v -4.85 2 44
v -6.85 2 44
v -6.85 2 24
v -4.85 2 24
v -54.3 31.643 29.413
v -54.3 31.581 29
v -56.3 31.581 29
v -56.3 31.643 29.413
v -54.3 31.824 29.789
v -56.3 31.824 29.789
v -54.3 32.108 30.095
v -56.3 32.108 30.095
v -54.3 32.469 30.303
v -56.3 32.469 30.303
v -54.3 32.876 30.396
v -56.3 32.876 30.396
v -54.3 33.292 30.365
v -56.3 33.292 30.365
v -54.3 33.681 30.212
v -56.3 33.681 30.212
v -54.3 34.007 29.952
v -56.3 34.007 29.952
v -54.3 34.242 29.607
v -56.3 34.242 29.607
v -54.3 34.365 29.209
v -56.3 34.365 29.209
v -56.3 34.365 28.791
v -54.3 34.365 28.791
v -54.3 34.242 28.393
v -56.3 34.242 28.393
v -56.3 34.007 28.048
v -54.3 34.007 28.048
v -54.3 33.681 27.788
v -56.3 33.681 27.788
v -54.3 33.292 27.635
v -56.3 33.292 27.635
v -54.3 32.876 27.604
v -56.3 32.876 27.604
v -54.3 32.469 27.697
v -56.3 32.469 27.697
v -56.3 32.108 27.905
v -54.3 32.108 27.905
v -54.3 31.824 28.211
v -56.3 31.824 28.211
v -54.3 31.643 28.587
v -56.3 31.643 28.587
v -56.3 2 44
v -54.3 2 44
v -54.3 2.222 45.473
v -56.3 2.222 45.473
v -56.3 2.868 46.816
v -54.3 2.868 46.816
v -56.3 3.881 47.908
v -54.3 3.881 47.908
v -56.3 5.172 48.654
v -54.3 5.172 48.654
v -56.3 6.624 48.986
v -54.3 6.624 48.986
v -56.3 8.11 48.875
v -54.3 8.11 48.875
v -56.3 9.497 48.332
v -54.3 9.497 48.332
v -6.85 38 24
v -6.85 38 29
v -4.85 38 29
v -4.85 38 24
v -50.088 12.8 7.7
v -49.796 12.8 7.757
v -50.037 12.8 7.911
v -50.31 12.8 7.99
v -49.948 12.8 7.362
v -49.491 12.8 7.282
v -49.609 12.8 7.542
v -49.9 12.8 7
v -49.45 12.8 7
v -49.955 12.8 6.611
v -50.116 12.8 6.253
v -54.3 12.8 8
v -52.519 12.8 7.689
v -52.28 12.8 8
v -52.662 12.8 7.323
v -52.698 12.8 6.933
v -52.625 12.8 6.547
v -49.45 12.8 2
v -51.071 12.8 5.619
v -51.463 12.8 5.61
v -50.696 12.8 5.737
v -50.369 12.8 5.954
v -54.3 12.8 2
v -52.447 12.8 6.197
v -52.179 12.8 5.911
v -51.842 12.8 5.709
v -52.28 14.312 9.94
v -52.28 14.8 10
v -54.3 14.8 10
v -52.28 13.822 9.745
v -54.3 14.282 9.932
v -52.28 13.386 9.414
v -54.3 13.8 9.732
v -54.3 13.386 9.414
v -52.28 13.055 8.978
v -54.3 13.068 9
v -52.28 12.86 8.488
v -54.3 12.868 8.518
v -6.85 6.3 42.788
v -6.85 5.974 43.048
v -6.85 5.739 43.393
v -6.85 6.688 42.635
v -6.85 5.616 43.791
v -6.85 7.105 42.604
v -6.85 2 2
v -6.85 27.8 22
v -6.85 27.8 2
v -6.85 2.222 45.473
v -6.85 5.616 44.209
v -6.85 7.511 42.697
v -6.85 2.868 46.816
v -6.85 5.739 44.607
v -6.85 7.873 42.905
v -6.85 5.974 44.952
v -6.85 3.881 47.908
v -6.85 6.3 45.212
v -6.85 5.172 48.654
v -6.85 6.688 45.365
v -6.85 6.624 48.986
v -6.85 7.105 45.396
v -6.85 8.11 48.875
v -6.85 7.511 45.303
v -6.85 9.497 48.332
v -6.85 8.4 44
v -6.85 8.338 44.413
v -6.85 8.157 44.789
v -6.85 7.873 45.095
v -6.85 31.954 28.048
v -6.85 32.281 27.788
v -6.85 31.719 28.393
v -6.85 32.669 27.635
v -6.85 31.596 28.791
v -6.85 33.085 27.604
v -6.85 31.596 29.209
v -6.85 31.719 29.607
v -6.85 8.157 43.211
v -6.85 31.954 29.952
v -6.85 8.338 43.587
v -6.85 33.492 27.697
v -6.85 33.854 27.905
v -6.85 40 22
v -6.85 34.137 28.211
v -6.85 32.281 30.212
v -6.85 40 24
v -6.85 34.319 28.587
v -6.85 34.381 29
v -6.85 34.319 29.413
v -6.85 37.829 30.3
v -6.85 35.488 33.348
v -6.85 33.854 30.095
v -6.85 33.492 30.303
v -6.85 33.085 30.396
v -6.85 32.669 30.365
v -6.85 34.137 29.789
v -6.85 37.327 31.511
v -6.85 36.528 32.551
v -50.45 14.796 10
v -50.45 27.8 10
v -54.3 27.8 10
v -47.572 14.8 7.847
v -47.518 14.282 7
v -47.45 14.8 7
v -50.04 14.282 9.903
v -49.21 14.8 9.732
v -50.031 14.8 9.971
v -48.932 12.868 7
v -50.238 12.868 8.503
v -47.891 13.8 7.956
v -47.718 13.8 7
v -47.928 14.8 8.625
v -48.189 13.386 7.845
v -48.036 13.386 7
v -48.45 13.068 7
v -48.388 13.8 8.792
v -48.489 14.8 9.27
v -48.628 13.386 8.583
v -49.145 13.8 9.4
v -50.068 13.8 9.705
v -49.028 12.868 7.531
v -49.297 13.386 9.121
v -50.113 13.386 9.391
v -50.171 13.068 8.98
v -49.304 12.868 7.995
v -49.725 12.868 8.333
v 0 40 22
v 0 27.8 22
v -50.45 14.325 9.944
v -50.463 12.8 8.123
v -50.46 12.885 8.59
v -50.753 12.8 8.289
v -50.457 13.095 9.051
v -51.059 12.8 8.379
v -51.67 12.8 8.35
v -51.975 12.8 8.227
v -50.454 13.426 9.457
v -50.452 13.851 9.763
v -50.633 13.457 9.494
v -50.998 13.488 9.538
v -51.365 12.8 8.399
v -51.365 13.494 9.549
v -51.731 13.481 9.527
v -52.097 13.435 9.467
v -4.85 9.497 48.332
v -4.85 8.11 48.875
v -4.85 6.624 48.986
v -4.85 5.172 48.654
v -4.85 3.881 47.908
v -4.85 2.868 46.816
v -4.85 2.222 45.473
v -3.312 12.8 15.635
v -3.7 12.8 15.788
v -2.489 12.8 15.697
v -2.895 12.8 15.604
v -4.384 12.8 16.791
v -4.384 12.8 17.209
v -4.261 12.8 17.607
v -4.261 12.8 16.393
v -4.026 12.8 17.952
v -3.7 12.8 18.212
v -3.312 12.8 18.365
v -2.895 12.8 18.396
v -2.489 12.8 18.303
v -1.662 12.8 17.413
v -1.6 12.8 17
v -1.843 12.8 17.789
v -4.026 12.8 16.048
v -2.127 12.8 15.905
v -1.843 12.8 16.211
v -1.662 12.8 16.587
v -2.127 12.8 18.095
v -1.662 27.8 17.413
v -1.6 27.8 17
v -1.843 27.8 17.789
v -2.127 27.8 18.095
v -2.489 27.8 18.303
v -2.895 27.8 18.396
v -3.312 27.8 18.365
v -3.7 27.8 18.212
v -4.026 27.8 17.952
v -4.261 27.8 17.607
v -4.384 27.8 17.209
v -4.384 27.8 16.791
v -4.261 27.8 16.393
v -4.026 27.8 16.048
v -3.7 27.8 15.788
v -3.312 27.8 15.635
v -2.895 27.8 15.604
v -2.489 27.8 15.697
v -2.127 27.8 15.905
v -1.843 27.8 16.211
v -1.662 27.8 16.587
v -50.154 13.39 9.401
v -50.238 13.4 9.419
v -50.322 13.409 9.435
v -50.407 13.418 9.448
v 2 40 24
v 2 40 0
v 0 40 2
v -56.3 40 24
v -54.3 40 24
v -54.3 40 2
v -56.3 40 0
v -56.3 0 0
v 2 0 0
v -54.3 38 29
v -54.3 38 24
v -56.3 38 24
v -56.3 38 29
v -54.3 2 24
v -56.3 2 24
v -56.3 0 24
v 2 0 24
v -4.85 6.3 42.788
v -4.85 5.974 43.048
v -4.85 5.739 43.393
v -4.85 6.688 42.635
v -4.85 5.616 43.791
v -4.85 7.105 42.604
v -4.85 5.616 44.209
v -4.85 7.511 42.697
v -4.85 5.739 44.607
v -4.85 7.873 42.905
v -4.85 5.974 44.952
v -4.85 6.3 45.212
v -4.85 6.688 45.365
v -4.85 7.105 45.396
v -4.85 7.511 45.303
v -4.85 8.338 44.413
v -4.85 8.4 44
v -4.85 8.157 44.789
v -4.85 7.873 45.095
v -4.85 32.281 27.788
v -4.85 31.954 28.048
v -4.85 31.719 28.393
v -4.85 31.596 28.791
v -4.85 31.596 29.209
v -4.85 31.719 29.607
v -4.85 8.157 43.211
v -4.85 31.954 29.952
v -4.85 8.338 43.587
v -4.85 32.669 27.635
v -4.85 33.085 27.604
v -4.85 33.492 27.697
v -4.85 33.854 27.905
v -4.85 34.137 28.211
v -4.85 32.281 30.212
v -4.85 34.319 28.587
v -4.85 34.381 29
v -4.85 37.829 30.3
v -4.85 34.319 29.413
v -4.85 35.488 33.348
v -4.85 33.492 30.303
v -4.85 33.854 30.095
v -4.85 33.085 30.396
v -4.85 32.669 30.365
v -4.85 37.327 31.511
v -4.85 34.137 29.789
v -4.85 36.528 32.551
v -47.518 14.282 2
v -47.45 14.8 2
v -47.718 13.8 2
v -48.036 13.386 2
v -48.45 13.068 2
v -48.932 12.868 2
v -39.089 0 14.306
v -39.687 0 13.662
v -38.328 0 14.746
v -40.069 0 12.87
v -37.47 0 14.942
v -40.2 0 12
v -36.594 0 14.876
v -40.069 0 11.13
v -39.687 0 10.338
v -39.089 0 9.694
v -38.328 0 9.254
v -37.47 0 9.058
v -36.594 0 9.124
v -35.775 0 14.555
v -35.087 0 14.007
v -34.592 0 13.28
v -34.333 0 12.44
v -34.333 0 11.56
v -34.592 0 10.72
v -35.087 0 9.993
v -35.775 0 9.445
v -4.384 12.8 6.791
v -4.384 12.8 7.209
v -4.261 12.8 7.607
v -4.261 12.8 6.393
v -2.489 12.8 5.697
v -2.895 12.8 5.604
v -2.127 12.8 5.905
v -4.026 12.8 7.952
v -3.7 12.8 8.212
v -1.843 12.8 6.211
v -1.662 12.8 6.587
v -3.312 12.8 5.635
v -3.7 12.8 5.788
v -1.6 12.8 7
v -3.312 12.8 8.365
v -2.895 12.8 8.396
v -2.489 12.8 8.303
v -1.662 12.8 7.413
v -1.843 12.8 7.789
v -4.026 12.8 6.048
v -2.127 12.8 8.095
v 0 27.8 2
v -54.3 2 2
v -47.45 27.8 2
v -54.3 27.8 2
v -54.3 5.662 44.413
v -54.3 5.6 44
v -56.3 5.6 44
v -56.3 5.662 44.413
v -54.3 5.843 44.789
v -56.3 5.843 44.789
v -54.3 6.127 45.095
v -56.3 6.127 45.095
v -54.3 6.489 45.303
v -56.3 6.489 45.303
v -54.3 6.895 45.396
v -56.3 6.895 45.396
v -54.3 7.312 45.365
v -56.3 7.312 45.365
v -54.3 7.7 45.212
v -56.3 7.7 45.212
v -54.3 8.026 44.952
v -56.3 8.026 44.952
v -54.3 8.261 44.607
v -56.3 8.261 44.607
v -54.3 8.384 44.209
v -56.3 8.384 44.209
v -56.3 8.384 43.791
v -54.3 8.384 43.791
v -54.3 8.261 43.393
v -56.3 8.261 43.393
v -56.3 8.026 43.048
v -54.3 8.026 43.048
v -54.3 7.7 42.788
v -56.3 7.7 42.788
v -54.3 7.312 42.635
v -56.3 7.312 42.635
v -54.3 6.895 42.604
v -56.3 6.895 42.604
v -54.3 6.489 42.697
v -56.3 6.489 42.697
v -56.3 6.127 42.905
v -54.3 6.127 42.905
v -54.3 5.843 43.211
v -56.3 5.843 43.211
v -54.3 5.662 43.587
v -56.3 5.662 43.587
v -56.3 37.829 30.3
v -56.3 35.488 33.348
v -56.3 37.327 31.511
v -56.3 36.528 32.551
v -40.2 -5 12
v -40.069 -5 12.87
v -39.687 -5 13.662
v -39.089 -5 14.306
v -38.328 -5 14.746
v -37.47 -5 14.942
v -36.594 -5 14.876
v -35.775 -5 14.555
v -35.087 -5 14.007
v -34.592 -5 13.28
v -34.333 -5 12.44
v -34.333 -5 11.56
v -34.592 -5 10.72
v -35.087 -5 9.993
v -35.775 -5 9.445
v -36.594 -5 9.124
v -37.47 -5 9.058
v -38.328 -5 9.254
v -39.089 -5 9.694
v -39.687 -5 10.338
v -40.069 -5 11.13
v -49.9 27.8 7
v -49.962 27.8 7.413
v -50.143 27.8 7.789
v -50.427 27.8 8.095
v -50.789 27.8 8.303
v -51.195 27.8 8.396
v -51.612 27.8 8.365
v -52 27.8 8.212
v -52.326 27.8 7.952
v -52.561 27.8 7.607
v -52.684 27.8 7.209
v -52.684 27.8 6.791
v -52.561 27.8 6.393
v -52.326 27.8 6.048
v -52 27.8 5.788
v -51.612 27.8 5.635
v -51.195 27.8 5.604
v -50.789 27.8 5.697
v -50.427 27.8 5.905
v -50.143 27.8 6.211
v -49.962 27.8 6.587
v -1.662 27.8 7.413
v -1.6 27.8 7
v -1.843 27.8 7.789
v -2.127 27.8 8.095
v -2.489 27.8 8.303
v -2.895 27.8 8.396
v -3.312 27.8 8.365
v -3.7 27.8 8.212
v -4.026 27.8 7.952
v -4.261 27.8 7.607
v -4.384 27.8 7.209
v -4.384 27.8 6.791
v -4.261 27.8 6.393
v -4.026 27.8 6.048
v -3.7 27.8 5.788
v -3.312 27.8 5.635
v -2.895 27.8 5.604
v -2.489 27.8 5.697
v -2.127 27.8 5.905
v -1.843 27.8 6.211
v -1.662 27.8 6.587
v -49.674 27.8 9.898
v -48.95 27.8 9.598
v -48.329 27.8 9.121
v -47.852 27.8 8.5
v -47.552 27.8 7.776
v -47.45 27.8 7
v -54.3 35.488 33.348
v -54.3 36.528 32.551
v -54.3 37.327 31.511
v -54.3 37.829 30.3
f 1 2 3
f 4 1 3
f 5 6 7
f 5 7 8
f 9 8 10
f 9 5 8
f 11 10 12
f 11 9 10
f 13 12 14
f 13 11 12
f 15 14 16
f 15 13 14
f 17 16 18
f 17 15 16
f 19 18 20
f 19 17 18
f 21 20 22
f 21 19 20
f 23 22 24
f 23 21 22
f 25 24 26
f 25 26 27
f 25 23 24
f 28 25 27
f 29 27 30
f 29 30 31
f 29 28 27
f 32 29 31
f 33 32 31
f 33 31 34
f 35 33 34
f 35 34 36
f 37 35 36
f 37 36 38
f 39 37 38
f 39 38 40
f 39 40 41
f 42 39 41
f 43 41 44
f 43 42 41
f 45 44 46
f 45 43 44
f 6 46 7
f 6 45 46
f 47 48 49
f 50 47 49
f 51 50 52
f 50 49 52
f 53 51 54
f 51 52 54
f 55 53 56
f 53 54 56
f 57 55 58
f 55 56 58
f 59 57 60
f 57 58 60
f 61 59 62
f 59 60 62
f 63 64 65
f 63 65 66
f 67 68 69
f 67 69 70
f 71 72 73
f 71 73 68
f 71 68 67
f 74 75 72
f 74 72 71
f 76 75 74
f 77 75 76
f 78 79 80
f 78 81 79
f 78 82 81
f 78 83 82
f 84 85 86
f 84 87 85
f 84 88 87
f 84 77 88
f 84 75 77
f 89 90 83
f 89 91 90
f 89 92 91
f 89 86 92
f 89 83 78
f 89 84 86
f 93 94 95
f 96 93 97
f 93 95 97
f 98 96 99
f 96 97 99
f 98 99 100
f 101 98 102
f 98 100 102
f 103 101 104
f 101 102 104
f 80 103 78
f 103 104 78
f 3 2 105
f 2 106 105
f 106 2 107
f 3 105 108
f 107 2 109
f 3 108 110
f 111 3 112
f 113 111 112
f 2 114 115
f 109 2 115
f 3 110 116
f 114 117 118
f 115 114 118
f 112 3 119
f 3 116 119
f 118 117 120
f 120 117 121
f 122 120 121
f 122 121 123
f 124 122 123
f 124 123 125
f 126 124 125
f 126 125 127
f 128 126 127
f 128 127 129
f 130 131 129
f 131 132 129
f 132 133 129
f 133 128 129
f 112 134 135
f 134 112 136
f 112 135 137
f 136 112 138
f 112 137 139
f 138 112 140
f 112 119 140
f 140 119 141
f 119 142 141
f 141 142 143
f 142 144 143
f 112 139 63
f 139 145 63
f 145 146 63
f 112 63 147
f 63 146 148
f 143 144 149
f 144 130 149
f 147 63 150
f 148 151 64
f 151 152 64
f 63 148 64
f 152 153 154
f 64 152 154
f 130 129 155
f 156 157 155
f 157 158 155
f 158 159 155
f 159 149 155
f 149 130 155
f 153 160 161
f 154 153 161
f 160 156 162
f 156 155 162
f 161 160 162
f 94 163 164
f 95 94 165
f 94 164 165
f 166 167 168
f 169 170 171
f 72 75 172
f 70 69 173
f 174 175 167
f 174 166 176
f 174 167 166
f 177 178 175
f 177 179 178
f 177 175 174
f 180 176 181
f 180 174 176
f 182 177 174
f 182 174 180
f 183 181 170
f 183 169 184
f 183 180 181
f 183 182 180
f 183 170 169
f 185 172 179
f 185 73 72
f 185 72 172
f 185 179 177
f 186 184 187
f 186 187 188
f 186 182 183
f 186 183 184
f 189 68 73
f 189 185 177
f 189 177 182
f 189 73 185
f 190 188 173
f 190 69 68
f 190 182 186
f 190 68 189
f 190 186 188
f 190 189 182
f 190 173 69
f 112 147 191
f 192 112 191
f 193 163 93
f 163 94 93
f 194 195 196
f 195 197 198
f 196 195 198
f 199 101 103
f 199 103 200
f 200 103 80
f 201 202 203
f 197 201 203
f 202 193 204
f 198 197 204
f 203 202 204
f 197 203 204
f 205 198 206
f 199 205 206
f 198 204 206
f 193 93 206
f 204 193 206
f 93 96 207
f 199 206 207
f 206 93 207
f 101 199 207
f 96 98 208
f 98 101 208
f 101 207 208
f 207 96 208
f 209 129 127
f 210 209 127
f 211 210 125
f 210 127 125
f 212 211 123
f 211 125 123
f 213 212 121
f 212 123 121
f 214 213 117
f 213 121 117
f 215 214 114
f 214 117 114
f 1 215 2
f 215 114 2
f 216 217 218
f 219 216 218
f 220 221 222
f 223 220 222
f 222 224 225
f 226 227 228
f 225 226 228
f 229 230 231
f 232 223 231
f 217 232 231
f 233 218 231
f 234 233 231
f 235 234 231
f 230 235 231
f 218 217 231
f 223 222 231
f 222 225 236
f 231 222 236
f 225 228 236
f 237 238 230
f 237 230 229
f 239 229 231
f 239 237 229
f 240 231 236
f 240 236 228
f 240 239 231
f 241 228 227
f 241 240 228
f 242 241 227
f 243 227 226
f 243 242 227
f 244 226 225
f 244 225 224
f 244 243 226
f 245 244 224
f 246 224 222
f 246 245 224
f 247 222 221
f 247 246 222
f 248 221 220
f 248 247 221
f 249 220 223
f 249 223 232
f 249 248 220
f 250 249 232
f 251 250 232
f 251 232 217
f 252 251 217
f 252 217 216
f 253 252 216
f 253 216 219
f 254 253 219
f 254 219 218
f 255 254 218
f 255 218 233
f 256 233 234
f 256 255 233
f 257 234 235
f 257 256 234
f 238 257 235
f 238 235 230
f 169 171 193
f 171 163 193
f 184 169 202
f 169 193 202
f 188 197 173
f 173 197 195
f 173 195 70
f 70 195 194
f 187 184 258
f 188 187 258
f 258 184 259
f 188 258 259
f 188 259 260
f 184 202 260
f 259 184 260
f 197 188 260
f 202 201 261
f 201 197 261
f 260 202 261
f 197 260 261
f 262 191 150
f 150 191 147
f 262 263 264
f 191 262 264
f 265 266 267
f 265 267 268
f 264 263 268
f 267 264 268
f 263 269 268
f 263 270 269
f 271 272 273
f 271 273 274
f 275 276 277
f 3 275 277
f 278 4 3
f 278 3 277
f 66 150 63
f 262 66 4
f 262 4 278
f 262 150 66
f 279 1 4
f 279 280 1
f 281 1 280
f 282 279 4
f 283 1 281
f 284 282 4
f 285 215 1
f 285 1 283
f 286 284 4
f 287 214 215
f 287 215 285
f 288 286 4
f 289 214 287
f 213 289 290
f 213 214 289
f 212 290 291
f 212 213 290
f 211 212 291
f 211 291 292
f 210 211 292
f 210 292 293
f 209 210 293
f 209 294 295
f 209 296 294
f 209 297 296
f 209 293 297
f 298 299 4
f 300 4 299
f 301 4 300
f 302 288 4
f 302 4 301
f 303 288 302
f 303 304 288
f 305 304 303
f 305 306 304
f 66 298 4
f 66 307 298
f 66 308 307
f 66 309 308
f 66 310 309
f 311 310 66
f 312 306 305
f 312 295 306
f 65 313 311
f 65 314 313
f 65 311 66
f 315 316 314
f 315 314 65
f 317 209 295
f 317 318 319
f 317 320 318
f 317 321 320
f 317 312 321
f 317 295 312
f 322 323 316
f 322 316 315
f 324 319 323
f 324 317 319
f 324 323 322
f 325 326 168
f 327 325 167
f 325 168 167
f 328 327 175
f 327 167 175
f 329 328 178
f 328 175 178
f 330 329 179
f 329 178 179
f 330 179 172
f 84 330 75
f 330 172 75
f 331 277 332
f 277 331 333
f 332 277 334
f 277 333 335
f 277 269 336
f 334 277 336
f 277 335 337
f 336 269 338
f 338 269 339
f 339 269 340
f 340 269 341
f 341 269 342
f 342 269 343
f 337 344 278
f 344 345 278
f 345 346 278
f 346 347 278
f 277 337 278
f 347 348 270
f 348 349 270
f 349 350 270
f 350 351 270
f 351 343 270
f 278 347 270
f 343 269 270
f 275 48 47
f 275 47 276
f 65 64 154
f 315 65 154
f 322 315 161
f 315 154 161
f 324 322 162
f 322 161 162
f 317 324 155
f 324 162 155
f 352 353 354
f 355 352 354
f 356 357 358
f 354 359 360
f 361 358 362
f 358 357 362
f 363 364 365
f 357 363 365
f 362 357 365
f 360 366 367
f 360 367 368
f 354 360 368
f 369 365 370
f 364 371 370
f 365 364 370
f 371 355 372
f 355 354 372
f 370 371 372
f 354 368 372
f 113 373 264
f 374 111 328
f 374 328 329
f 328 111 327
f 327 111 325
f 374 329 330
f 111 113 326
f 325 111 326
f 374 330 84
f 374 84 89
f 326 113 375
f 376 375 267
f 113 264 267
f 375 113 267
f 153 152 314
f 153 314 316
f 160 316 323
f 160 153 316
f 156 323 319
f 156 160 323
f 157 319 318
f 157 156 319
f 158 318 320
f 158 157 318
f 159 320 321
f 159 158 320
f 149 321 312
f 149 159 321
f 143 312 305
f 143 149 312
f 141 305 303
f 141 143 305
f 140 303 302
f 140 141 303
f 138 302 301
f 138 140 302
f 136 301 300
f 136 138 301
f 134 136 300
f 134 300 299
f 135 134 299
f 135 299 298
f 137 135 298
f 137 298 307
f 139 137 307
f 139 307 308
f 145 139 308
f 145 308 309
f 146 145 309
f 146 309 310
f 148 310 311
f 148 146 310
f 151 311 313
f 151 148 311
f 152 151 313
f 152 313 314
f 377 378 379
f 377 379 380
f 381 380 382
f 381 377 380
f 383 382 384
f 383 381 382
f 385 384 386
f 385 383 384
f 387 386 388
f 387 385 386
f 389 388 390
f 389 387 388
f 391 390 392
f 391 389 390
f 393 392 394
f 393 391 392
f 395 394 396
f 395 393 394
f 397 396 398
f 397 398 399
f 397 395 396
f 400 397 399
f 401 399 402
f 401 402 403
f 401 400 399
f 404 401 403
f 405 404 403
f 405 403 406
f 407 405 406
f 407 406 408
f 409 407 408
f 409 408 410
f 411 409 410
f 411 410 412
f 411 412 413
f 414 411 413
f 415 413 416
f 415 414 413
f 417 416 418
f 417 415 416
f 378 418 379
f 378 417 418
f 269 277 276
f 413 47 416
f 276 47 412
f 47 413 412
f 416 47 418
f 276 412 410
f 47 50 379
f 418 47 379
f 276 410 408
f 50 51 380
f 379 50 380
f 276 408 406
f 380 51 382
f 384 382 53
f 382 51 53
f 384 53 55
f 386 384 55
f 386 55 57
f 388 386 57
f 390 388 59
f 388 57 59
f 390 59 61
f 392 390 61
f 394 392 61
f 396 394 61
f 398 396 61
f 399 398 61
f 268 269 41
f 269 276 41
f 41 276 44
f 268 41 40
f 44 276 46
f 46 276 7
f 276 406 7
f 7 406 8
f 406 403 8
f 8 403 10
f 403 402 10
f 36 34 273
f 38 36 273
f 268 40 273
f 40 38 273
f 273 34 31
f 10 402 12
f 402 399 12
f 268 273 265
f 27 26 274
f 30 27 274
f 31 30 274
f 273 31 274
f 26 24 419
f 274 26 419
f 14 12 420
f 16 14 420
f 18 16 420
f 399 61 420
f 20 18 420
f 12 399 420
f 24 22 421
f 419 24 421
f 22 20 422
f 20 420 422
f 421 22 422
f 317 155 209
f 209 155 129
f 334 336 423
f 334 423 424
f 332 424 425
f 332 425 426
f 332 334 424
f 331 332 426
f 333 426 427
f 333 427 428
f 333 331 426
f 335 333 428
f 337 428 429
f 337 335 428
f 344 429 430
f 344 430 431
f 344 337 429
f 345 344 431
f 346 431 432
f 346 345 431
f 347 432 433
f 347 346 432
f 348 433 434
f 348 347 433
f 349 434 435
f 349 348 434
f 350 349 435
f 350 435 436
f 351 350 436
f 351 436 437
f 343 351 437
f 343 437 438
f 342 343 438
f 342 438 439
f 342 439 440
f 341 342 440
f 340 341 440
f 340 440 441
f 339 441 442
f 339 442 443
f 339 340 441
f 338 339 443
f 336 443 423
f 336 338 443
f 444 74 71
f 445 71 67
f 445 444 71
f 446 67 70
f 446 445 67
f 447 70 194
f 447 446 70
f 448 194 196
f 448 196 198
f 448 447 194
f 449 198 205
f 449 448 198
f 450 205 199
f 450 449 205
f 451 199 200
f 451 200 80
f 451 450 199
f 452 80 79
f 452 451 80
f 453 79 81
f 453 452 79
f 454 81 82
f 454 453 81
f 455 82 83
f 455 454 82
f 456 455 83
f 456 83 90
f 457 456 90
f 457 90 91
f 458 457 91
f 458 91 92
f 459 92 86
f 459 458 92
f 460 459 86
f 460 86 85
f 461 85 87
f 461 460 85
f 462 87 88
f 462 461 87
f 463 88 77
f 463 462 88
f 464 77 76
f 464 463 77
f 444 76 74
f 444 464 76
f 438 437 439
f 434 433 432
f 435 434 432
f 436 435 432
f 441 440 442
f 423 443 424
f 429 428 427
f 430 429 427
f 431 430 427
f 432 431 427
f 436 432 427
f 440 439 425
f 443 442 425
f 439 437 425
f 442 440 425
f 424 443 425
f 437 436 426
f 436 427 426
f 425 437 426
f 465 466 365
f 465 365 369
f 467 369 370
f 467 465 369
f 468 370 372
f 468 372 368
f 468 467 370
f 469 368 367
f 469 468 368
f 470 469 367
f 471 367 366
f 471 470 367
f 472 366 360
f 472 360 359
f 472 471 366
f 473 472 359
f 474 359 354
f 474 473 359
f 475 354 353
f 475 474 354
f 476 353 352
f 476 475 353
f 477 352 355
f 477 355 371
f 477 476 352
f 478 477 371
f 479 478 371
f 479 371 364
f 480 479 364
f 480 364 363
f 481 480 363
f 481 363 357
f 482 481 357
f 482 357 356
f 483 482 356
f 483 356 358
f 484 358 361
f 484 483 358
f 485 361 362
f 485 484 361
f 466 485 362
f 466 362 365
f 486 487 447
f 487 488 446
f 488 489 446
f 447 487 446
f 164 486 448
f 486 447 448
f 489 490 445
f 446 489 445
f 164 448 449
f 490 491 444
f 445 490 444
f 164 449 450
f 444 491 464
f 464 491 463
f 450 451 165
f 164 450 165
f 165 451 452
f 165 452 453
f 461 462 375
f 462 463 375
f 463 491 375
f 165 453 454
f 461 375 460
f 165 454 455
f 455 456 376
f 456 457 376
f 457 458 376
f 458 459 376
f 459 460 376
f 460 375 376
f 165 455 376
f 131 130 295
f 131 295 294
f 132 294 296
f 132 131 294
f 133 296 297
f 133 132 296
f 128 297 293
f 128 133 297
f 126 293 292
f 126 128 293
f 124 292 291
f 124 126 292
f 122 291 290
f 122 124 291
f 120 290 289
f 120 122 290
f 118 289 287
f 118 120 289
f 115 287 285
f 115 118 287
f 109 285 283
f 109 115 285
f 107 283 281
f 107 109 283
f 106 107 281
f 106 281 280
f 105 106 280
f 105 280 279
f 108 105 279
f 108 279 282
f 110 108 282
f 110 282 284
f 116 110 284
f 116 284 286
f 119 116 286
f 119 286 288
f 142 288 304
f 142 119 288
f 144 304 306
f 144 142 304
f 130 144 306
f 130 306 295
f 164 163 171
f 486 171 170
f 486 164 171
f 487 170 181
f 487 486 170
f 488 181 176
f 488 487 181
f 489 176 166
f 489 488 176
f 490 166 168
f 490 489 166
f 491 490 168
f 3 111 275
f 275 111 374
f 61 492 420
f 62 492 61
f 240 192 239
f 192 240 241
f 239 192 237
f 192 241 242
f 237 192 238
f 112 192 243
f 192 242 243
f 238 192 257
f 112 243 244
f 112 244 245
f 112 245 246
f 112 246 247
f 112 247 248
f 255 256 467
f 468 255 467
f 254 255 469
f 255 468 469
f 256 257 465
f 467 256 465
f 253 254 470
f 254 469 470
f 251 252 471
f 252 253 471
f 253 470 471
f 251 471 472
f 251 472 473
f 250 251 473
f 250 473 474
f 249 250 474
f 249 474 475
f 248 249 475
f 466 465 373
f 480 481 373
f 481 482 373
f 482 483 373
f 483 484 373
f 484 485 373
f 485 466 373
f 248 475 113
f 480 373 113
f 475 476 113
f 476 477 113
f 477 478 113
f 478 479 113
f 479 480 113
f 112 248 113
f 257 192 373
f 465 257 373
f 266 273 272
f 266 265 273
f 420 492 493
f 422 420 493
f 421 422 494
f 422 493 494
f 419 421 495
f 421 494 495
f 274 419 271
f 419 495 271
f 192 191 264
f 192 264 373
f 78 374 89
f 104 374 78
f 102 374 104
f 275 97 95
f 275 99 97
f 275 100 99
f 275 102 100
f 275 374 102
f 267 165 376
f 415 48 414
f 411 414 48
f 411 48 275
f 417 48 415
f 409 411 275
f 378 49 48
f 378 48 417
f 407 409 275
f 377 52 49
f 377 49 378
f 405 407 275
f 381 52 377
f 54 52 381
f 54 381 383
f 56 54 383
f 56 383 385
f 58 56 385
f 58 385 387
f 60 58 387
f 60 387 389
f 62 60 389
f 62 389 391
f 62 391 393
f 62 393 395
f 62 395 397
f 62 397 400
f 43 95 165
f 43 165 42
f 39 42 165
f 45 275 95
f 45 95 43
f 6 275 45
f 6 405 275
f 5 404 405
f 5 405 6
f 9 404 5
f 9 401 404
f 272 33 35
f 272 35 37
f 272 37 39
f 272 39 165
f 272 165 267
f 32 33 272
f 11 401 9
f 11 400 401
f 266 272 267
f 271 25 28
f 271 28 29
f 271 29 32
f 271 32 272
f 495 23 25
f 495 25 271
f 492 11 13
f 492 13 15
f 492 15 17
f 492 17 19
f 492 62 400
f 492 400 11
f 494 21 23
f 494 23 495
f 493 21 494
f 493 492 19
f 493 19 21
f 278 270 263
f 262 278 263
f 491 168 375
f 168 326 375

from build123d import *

# Parameters (mm, degrees)
SKETCH_W        = 54.3
SKETCH_H        = 38
PAD_DEPTH       = 2
SKETCH001_W     = 54.3
SKETCH001_H     = 2
PAD001_DEPTH    = 22
SKETCH002_R     = 2.95
PAD002_DEPTH    = 5
SKETCH003_W     = 40
SKETCH003_H     = 22
PAD003_DEPTH    = 2
SKETCH004_W     = 40
SKETCH004_H     = 22
PAD004_DEPTH    = 2
SKETCH005_W     = 6.85
SKETCH005_H     = 15
PAD005_DEPTH    = 8
SKETCH006_R     = 1.4
POCKET_DEPTH    = 15
FILLET_R        = 3
FILLET001_R     = 2
SKETCH007_W     = 6.85
SKETCH007_H     = 25.8
PAD006_DEPTH    = 20
SKETCH008_R     = 1.4
POCKET001_DEPTH = 15
PAD007_DEPTH    = 2
SKETCH010_R     = 1.4
PAD008_DEPTH    = 2
SKETCH011_R     = 1.4
PAD009_DEPTH    = 2


with BuildPart() as body:
    # Sketch → Pad (new body)
    with BuildSketch(Plane.XY):
        with Locations((27.15, 21)):
            Rectangle(SKETCH_W, SKETCH_H)
    extrude(amount=PAD_DEPTH)

    # Sketch001 → Pad001 (join)
    with BuildSketch(Plane.XY):
        with Locations((27.15, 1)):
            Rectangle(SKETCH001_W, SKETCH001_H)
    extrude(amount=PAD001_DEPTH)

    # Sketch002 → Pad002 (join)
    with BuildSketch(Plane.XZ):
        with Locations((37.25, 12)):
            Circle(SKETCH002_R)
    extrude(amount=PAD002_DEPTH)

    # Sketch003 (on Face2 of Pad002) → Pad003 (join)
    with BuildSketch(Plane(origin=(0, 0, 0), x_dir=(0, -1, 0), z_dir=(-1, 0, 0))):
        with Locations((-20, 11)):
            Rectangle(SKETCH003_W, SKETCH003_H)
    extrude(amount=PAD003_DEPTH)

    # Sketch004 (on Face3 of Pad003) → Pad004 (join)
    with BuildSketch(Plane.YZ.offset(54.3)):
        with Locations((20, 11)):
            Rectangle(SKETCH004_W, SKETCH004_H)
    extrude(amount=PAD004_DEPTH)

    # Sketch005 (on Face5 of Pad004) → Pad005 (join)
    with BuildSketch(Plane.XY.offset(2)):
        with Locations((50.875, 20.3)):
            Rectangle(SKETCH005_W, SKETCH005_H)
    extrude(amount=PAD005_DEPTH)

    # Sketch006 (on Face15 of Pad005) → Pocket (cut)
    with BuildSketch(Plane(origin=(0, 27.8, 0), x_dir=(-1, 0, 0), z_dir=(0, 1, 0))):
        with Locations((-51.3, 7)):
            Circle(SKETCH006_R)
    extrude(amount=-POCKET_DEPTH, mode=Mode.SUBTRACT)

    # Fillet
    fillet_edges = [body.edges().sort_by_distance(p)[0] for p in [
        (47.45, 20.3, 10),
    ]]
    fillet(fillet_edges, radius=FILLET_R)

    # Fillet001
    fillet001_edges = [body.edges().sort_by_distance(p)[0] for p in [
        (52.375, 12.8, 10),
    ]]
    fillet(fillet001_edges, radius=FILLET001_R)

    # Sketch007 (on Face5 of Fillet001) → Pad006 (join)
    with BuildSketch(Plane.XY.offset(2)):
        with Locations((3.425, 14.9)):
            Rectangle(SKETCH007_W, SKETCH007_H)
    extrude(amount=PAD006_DEPTH)

    # Sketch008 (on Face14 of Pad006) → Pocket001 (cut)
    with BuildSketch(Plane(origin=(0, 27.8, 0), x_dir=(-1, 0, 0), z_dir=(0, 1, 0))):
        with Locations((-3, 7)):
            Circle(SKETCH008_R)
        with Locations((-3, 17)):
            Circle(SKETCH008_R)
    extrude(amount=-POCKET001_DEPTH, mode=Mode.SUBTRACT)

    # Sketch009 (on Face21 of Pocket001) → Pad007 (join)
    with BuildSketch(Plane.XY.offset(22)):
        Polygon((54.3, 2), (54.3, 40), (56.3, 40), (56.3, 0), (-2, 0), (-2, 40), (6.85, 40), (6.85, 2), align=None)
    extrude(amount=PAD007_DEPTH)

    # Sketch010 (on Face22 of Pad007) → Pad008 (join)
    with BuildSketch(Plane.YZ.offset(6.85)):
        with BuildLine():
            Line((2, 24), (38, 24))
            Line((38, 29), (38, 24))
            ThreePointArc((38, 29), (37.326745, 31.511013), (35.487593, 33.348396))
            Line((35.487593, 33.348396), (9.497223, 48.331729))
            ThreePointArc((9.497223, 48.331729), (4.498612, 48.329325), (2, 44))
            Line((2, 44), (2, 24))
        make_face()
        with Locations((7, 44)):
            Circle(SKETCH010_R, mode=Mode.SUBTRACT)
        with Locations((32.980762, 29)):
            Circle(SKETCH010_R, mode=Mode.SUBTRACT)
    extrude(amount=-PAD008_DEPTH)

    # Sketch011 (on Face20 of Pad008) → Pad009 (join)
    with BuildSketch(Plane(origin=(54.3, 0, 0), x_dir=(0, -1, 0), z_dir=(-1, 0, 0))):
        with BuildLine():
            Line((-38, 24), (-38, 29))
            ThreePointArc((-35.487593, 33.348396), (-37.326745, 31.511013), (-38, 29))
            Line((-35.487593, 33.348396), (-9.497223, 48.331729))
            ThreePointArc((-2, 44), (-4.498612, 48.329325), (-9.497223, 48.331729))
            Line((-2, 44), (-2, 24))
            Line((-2, 24), (-38, 24))
        make_face()
        with Locations((-7, 44)):
            Circle(SKETCH011_R, mode=Mode.SUBTRACT)
        with Locations((-32.980762, 29)):
            Circle(SKETCH011_R, mode=Mode.SUBTRACT)
    extrude(amount=-PAD009_DEPTH)


with BuildPart() as part_mirroring:
    # Part__Mirroring: instance of Body
    add(body.part.mirror(Plane(origin=(0, 0, 0), x_dir=(0, -1, 0), z_dir=(1, 0, 0))))


solid = part_mirroring.part
